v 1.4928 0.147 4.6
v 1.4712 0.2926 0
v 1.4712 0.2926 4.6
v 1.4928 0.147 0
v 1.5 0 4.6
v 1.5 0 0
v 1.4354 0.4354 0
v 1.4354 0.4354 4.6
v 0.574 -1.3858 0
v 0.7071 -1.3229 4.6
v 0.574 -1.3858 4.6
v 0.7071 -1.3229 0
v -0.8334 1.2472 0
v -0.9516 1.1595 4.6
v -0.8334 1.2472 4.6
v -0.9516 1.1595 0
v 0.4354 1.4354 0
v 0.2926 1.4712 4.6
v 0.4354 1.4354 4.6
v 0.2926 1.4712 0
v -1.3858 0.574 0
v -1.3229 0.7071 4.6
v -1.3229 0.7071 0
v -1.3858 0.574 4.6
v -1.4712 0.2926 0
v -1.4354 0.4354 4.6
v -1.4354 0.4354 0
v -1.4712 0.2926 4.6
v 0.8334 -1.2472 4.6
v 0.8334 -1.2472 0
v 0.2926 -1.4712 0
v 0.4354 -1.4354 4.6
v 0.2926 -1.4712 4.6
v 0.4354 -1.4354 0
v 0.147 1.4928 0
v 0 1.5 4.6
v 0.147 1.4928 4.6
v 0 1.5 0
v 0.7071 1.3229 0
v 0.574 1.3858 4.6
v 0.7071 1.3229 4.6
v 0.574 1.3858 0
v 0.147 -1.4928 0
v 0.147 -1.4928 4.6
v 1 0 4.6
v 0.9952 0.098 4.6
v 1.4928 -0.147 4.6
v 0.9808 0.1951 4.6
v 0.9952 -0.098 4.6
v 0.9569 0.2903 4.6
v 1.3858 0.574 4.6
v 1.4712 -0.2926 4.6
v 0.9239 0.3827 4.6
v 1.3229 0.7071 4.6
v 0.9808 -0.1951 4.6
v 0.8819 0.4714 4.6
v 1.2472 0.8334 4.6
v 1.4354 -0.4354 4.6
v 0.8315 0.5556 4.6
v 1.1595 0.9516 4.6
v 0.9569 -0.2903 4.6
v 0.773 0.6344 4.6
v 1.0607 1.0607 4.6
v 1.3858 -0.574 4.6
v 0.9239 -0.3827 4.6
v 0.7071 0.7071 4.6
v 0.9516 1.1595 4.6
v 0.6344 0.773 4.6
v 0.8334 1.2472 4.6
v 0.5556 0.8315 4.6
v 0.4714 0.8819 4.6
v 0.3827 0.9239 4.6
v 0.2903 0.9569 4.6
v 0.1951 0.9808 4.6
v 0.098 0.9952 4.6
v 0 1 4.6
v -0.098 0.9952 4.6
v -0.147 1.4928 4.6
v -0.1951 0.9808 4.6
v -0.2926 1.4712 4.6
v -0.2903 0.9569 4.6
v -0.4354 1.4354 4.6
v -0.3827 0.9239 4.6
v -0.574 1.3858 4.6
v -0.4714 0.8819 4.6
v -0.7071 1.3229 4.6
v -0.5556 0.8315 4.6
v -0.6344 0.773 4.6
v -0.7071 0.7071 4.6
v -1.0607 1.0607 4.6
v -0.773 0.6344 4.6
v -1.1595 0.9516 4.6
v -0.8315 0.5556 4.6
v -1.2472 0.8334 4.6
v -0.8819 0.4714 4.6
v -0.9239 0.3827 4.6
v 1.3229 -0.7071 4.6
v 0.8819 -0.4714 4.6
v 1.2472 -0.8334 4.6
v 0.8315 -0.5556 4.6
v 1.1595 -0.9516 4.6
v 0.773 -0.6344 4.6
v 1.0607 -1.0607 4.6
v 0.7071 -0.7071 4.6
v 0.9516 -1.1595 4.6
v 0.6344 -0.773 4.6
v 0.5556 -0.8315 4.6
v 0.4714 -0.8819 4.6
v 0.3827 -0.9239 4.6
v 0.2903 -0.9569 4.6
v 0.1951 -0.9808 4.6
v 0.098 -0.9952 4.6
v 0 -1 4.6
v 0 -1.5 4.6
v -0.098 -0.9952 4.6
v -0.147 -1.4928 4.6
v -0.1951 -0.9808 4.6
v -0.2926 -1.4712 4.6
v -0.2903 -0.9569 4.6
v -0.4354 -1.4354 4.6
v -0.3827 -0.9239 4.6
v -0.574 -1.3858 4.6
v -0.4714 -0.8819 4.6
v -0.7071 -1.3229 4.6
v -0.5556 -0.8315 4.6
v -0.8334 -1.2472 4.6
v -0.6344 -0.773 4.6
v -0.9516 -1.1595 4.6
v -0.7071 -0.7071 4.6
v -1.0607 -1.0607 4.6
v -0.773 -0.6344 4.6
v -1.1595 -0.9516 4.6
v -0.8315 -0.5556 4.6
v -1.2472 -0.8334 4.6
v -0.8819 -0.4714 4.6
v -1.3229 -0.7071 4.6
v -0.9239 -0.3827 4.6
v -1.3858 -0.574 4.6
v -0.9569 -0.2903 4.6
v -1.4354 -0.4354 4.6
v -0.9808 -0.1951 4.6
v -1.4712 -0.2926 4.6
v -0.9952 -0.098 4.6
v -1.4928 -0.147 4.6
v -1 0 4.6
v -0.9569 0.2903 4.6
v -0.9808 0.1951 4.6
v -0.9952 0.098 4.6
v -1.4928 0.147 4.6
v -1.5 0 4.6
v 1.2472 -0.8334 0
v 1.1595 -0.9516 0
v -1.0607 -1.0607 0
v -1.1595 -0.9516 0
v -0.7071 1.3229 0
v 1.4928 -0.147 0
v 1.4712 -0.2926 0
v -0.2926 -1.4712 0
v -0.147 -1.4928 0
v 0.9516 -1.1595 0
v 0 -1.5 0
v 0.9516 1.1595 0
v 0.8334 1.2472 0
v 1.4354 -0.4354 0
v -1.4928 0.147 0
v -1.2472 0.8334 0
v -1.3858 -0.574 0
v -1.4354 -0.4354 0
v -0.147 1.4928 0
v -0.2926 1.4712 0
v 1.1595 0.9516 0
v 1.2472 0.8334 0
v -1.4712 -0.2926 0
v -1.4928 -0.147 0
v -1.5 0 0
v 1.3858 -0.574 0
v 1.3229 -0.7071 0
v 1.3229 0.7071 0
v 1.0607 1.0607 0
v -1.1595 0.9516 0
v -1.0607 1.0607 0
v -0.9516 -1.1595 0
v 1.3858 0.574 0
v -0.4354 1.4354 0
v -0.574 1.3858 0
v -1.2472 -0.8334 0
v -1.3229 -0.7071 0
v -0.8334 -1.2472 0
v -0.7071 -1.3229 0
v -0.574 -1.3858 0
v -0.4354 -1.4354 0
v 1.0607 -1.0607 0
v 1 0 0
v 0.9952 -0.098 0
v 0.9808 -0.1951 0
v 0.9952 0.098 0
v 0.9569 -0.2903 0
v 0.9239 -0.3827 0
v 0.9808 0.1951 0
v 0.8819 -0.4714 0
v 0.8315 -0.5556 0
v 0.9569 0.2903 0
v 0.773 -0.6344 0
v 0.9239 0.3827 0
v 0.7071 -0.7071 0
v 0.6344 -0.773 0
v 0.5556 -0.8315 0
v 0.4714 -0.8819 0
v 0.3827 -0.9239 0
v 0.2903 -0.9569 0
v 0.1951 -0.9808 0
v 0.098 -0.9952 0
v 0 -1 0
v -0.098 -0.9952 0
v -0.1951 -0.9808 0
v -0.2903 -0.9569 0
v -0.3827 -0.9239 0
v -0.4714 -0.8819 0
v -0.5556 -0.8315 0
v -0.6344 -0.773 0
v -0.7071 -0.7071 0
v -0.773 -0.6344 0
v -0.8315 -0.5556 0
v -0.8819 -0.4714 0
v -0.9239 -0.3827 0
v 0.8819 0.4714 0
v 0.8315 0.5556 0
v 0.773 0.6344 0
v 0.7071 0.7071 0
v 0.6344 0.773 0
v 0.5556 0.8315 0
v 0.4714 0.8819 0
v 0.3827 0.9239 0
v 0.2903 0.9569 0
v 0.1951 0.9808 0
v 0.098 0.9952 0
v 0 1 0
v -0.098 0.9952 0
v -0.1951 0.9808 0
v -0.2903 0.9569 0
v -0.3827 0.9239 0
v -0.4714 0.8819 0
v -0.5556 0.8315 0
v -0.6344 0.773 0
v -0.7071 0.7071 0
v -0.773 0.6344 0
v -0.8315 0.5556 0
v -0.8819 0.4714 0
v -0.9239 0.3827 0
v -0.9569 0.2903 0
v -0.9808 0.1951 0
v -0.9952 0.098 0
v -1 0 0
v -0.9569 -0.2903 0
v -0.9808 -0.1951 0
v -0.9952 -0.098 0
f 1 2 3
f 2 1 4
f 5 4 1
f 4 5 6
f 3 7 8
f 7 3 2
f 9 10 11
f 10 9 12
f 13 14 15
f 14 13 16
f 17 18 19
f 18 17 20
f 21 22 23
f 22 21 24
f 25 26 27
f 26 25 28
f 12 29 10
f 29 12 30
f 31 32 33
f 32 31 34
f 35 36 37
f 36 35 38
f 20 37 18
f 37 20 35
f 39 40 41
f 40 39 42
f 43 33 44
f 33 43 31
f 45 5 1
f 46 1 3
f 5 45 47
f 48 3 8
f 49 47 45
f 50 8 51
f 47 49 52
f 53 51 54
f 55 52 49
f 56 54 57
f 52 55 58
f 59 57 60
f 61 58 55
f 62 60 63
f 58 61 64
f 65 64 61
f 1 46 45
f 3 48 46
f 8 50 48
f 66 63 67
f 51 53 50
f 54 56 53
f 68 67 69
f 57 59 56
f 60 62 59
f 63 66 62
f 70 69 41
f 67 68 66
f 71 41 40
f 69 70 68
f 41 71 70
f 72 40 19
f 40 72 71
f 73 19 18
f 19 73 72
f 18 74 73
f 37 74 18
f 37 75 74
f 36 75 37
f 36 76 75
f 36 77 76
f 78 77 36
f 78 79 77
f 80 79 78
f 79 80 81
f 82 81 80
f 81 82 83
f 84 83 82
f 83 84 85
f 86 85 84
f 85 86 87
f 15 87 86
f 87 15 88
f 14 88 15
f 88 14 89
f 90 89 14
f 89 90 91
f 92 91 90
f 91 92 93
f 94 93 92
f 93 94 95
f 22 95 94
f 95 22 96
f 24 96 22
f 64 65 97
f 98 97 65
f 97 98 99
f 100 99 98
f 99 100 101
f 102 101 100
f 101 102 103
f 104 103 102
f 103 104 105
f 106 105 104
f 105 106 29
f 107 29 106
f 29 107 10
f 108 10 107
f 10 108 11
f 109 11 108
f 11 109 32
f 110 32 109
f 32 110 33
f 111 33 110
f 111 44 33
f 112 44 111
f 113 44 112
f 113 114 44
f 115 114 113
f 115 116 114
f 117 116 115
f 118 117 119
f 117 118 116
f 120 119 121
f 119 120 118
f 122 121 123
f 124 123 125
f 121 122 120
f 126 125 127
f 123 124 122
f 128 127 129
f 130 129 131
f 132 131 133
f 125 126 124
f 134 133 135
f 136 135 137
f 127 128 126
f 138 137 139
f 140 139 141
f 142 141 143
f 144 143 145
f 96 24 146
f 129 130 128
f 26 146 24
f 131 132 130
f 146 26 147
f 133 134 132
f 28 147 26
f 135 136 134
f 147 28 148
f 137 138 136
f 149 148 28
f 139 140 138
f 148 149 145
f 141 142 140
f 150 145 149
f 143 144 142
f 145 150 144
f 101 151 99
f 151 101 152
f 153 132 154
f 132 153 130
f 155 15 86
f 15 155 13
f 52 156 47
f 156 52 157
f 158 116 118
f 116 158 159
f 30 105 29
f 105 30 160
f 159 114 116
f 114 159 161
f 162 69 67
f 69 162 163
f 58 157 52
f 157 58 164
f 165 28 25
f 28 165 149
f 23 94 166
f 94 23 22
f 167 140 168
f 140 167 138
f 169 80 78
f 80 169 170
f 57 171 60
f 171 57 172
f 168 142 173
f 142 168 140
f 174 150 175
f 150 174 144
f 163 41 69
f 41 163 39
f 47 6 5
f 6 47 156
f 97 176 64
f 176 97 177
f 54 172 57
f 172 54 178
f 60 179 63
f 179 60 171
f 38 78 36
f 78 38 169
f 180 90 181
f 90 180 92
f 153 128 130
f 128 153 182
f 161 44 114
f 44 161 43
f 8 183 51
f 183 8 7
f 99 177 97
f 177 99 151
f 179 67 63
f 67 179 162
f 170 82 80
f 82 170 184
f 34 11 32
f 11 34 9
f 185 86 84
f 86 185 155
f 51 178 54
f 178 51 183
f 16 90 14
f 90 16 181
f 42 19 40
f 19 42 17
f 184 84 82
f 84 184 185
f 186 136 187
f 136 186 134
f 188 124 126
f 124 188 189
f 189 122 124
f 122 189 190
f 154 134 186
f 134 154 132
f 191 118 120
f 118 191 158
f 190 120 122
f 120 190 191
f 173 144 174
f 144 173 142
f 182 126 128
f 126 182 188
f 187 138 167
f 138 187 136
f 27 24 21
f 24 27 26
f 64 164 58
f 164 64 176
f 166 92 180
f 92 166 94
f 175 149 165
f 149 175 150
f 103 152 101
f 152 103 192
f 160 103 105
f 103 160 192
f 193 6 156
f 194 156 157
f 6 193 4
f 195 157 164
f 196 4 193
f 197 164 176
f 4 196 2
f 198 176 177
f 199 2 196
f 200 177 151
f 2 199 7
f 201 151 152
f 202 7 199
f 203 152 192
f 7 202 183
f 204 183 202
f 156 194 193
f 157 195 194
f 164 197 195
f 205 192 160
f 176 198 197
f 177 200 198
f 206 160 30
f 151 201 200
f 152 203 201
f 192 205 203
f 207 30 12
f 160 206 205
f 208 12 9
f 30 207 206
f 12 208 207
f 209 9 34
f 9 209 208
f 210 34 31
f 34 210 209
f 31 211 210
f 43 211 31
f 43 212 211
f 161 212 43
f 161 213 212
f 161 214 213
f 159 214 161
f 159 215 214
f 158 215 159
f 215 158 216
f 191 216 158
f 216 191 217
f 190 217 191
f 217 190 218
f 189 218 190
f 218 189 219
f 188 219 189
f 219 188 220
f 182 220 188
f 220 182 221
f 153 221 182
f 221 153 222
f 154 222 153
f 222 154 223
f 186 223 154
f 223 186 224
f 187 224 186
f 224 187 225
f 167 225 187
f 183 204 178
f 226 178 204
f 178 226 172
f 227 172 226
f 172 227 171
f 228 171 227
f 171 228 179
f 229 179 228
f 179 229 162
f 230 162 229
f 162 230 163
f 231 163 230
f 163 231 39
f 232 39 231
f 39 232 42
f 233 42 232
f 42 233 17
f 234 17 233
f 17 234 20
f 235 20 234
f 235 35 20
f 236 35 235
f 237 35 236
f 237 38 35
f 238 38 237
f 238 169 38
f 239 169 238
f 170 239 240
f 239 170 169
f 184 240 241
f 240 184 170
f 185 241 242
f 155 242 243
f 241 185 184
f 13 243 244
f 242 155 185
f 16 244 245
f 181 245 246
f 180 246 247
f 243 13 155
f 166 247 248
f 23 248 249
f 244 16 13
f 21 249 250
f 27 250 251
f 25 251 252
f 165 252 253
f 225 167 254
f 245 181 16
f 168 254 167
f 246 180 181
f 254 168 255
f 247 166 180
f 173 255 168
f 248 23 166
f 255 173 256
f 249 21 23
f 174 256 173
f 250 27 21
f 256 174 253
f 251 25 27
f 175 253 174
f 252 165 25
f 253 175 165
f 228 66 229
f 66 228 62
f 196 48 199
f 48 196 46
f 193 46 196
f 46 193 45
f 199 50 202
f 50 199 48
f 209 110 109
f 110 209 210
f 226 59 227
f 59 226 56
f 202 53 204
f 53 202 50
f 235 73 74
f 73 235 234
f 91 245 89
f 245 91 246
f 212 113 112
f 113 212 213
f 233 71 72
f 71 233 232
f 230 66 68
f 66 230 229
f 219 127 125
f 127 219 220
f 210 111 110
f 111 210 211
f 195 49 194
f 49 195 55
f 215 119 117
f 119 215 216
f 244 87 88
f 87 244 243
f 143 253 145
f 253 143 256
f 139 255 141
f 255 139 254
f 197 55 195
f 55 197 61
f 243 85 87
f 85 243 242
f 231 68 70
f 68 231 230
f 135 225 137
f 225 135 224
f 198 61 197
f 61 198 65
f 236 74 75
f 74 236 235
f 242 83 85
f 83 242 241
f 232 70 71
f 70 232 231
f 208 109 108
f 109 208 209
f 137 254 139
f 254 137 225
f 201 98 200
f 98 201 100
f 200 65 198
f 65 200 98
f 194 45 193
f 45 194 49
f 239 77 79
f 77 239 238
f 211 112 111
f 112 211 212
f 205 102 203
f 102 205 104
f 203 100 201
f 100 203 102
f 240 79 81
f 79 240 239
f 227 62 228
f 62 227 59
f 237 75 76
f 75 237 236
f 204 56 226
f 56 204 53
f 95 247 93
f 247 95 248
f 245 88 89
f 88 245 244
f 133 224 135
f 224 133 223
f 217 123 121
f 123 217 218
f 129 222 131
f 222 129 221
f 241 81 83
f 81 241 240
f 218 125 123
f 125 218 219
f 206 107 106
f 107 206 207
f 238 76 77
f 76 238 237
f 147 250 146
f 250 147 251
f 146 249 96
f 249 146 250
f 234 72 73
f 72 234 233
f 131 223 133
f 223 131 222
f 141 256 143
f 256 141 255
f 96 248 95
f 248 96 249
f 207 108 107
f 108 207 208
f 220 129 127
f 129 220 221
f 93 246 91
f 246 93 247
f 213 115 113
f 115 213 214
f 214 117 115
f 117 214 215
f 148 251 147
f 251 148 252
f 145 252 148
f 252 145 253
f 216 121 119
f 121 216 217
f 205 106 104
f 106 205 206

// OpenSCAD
module threaded_insert() {
    difference() {
        cylinder(h=4.6, d=3.0, $fn=64);
        translate([0, 0, -1])
            cylinder(h=6.6, d=2.0, $fn=64);
    }
}

threaded_insert();
